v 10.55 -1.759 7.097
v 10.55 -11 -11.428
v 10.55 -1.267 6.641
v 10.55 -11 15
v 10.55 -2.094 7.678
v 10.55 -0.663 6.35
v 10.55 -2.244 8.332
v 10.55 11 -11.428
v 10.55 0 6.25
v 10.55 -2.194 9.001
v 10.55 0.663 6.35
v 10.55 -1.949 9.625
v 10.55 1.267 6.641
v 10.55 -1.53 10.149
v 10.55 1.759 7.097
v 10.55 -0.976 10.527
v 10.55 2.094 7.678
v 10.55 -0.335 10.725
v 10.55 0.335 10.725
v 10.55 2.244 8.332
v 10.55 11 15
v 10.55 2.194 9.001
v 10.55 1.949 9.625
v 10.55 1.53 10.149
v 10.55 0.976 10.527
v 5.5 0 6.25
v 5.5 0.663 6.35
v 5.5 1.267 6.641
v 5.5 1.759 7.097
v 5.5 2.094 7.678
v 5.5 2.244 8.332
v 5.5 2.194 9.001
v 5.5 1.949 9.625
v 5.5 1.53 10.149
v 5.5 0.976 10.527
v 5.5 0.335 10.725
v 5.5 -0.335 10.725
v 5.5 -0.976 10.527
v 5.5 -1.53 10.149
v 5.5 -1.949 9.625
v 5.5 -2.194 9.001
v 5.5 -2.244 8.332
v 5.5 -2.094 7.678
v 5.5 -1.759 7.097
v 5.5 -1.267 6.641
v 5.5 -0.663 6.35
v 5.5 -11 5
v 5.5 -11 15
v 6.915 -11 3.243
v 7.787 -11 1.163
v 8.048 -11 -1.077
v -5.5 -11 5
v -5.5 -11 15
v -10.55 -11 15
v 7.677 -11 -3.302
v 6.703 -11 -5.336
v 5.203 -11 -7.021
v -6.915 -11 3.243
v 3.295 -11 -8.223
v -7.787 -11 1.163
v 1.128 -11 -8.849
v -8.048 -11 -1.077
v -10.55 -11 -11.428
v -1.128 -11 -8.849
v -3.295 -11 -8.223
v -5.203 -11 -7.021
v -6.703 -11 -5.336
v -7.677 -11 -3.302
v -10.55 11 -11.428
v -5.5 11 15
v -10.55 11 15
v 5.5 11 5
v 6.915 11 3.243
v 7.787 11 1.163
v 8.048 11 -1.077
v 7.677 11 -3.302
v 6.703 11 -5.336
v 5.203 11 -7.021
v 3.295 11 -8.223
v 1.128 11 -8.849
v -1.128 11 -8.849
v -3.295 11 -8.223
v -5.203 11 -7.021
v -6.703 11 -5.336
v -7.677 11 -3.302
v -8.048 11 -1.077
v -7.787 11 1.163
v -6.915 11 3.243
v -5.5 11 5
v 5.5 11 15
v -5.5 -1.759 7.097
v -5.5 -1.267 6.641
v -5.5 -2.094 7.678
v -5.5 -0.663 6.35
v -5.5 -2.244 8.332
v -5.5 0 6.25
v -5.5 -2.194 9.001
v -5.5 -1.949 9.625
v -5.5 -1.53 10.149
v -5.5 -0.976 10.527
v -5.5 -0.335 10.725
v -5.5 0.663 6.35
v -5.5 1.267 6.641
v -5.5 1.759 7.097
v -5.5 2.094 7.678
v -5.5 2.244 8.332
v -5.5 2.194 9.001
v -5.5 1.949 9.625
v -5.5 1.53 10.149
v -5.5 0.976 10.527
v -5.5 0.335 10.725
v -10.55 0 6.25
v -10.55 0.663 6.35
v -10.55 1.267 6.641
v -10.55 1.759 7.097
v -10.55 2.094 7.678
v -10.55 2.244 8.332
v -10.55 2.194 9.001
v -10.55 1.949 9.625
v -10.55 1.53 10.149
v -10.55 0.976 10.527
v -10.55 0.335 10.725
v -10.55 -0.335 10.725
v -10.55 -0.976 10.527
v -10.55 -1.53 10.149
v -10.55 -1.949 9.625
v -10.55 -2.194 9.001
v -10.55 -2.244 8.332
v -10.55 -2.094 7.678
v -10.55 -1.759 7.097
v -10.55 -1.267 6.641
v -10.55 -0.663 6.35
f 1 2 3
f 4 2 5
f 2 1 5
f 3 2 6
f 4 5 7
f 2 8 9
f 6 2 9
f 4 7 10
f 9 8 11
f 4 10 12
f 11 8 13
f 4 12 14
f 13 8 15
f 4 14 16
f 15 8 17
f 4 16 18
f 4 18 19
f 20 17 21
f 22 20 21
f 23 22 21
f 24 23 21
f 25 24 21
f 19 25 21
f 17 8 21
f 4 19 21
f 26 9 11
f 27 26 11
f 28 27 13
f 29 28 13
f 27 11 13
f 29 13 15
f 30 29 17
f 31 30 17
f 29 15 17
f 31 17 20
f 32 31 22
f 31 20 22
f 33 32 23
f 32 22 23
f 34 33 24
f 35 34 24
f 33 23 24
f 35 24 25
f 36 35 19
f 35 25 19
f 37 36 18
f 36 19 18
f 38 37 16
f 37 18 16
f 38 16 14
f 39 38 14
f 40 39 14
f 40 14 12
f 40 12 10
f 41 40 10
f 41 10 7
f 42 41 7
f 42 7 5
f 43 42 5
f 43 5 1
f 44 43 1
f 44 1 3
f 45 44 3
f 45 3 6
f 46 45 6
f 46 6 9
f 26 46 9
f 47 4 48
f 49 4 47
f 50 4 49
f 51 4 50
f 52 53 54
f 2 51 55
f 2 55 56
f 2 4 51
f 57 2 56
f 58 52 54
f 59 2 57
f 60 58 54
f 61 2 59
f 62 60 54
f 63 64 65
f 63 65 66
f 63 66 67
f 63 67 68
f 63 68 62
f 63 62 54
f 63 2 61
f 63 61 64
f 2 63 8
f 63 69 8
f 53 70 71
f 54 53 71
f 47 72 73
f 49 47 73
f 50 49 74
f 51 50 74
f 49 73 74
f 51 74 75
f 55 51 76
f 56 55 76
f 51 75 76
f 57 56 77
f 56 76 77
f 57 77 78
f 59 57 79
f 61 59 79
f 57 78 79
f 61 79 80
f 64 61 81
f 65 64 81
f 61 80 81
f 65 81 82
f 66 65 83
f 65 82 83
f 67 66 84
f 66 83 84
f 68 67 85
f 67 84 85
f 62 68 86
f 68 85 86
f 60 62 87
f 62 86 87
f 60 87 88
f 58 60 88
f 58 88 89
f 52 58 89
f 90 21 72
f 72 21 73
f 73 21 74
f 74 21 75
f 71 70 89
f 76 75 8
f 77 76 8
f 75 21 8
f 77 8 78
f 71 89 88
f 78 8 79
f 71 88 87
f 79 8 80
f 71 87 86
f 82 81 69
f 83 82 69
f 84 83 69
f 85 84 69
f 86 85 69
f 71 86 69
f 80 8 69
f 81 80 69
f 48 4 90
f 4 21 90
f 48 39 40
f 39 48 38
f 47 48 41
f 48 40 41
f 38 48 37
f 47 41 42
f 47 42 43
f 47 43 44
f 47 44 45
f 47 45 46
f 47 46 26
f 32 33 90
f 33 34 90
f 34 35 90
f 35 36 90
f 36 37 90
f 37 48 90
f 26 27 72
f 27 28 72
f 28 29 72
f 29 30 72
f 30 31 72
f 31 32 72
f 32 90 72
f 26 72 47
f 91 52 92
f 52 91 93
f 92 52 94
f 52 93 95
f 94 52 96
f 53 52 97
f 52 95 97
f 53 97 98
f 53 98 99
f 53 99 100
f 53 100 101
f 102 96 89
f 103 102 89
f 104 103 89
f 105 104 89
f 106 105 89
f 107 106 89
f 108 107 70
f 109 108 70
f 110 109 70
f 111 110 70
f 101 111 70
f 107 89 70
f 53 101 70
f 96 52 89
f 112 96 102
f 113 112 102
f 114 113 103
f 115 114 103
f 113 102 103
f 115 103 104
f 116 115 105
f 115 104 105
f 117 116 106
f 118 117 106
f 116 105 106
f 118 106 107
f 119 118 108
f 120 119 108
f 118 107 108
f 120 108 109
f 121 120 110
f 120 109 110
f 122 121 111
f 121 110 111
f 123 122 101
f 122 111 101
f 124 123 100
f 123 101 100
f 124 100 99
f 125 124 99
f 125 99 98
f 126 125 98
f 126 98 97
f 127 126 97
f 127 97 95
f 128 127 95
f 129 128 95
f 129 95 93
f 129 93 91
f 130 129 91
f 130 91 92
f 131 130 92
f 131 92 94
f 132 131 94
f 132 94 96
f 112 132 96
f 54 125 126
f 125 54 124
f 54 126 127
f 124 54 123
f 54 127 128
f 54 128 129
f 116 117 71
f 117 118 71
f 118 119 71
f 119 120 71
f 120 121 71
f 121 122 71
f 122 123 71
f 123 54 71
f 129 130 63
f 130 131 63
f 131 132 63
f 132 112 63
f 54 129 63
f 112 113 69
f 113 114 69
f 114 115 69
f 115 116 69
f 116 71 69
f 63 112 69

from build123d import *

# Parameters (mm, degrees)
BOSS_EXTRUDE1_DEPTH = 11
CUT_EXTRUDE1_REACH  = 30.128
SKETCH2_R           = 2.25


with BuildPart() as part:
    # Sketch1 → Boss-Extrude1 (new, symmetric)
    with BuildSketch(Plane(origin=(0, 0, 0), x_dir=(1, 0, 0), z_dir=(0, 1, 0))):
        with BuildLine():
            Line((-5.5, -15), (-10.55, -15))
            Line((-10.55, -15), (-10.55, 11.42813746))
            Line((-10.55, 11.42813746), (10.55, 11.42813746))
            Line((10.55, 11.42813746), (10.55, -15))
            Line((10.55, -15), (5.5, -15))
            Line((5.5, -15), (5.5, -5))
            ThreePointArc((5.5, -5), (0, 8.92813746), (-5.5, -5))
            Line((-5.5, -5), (-5.5, -15))
        make_face()
    extrude(amount=BOSS_EXTRUDE1_DEPTH, both=True)

    # Cut-Extrude1: up to this face of the body (flat: up to its plane)
    cut_extrude1_end = Plane(part.part.faces().sort_by_distance((-10.55, 0, 1.78593127))[0])
    # Sketch2 → Cut-Extrude1 (cut, up to the picked face)
    with BuildSketch(Plane(origin=(10.55, 0, 0), x_dir=(0, 0, -1), z_dir=(1, 0, 0)), mode=Mode.PRIVATE) as cut_extrude1_sk1:
        with Locations((-8.5, 0)):
            Circle(SKETCH2_R)
    cut_extrude1_tool1 = split(extrude(cut_extrude1_sk1.sketch, amount=-CUT_EXTRUDE1_REACH, mode=Mode.PRIVATE), bisect_by=cut_extrude1_end, keep=Keep.BOTH, mode=Mode.PRIVATE)
    add(cut_extrude1_tool1.solids().sort_by(Axis((10.55, 0, 8.5), (-1, 0, 0)))[0], mode=Mode.SUBTRACT)


solid = part.part
